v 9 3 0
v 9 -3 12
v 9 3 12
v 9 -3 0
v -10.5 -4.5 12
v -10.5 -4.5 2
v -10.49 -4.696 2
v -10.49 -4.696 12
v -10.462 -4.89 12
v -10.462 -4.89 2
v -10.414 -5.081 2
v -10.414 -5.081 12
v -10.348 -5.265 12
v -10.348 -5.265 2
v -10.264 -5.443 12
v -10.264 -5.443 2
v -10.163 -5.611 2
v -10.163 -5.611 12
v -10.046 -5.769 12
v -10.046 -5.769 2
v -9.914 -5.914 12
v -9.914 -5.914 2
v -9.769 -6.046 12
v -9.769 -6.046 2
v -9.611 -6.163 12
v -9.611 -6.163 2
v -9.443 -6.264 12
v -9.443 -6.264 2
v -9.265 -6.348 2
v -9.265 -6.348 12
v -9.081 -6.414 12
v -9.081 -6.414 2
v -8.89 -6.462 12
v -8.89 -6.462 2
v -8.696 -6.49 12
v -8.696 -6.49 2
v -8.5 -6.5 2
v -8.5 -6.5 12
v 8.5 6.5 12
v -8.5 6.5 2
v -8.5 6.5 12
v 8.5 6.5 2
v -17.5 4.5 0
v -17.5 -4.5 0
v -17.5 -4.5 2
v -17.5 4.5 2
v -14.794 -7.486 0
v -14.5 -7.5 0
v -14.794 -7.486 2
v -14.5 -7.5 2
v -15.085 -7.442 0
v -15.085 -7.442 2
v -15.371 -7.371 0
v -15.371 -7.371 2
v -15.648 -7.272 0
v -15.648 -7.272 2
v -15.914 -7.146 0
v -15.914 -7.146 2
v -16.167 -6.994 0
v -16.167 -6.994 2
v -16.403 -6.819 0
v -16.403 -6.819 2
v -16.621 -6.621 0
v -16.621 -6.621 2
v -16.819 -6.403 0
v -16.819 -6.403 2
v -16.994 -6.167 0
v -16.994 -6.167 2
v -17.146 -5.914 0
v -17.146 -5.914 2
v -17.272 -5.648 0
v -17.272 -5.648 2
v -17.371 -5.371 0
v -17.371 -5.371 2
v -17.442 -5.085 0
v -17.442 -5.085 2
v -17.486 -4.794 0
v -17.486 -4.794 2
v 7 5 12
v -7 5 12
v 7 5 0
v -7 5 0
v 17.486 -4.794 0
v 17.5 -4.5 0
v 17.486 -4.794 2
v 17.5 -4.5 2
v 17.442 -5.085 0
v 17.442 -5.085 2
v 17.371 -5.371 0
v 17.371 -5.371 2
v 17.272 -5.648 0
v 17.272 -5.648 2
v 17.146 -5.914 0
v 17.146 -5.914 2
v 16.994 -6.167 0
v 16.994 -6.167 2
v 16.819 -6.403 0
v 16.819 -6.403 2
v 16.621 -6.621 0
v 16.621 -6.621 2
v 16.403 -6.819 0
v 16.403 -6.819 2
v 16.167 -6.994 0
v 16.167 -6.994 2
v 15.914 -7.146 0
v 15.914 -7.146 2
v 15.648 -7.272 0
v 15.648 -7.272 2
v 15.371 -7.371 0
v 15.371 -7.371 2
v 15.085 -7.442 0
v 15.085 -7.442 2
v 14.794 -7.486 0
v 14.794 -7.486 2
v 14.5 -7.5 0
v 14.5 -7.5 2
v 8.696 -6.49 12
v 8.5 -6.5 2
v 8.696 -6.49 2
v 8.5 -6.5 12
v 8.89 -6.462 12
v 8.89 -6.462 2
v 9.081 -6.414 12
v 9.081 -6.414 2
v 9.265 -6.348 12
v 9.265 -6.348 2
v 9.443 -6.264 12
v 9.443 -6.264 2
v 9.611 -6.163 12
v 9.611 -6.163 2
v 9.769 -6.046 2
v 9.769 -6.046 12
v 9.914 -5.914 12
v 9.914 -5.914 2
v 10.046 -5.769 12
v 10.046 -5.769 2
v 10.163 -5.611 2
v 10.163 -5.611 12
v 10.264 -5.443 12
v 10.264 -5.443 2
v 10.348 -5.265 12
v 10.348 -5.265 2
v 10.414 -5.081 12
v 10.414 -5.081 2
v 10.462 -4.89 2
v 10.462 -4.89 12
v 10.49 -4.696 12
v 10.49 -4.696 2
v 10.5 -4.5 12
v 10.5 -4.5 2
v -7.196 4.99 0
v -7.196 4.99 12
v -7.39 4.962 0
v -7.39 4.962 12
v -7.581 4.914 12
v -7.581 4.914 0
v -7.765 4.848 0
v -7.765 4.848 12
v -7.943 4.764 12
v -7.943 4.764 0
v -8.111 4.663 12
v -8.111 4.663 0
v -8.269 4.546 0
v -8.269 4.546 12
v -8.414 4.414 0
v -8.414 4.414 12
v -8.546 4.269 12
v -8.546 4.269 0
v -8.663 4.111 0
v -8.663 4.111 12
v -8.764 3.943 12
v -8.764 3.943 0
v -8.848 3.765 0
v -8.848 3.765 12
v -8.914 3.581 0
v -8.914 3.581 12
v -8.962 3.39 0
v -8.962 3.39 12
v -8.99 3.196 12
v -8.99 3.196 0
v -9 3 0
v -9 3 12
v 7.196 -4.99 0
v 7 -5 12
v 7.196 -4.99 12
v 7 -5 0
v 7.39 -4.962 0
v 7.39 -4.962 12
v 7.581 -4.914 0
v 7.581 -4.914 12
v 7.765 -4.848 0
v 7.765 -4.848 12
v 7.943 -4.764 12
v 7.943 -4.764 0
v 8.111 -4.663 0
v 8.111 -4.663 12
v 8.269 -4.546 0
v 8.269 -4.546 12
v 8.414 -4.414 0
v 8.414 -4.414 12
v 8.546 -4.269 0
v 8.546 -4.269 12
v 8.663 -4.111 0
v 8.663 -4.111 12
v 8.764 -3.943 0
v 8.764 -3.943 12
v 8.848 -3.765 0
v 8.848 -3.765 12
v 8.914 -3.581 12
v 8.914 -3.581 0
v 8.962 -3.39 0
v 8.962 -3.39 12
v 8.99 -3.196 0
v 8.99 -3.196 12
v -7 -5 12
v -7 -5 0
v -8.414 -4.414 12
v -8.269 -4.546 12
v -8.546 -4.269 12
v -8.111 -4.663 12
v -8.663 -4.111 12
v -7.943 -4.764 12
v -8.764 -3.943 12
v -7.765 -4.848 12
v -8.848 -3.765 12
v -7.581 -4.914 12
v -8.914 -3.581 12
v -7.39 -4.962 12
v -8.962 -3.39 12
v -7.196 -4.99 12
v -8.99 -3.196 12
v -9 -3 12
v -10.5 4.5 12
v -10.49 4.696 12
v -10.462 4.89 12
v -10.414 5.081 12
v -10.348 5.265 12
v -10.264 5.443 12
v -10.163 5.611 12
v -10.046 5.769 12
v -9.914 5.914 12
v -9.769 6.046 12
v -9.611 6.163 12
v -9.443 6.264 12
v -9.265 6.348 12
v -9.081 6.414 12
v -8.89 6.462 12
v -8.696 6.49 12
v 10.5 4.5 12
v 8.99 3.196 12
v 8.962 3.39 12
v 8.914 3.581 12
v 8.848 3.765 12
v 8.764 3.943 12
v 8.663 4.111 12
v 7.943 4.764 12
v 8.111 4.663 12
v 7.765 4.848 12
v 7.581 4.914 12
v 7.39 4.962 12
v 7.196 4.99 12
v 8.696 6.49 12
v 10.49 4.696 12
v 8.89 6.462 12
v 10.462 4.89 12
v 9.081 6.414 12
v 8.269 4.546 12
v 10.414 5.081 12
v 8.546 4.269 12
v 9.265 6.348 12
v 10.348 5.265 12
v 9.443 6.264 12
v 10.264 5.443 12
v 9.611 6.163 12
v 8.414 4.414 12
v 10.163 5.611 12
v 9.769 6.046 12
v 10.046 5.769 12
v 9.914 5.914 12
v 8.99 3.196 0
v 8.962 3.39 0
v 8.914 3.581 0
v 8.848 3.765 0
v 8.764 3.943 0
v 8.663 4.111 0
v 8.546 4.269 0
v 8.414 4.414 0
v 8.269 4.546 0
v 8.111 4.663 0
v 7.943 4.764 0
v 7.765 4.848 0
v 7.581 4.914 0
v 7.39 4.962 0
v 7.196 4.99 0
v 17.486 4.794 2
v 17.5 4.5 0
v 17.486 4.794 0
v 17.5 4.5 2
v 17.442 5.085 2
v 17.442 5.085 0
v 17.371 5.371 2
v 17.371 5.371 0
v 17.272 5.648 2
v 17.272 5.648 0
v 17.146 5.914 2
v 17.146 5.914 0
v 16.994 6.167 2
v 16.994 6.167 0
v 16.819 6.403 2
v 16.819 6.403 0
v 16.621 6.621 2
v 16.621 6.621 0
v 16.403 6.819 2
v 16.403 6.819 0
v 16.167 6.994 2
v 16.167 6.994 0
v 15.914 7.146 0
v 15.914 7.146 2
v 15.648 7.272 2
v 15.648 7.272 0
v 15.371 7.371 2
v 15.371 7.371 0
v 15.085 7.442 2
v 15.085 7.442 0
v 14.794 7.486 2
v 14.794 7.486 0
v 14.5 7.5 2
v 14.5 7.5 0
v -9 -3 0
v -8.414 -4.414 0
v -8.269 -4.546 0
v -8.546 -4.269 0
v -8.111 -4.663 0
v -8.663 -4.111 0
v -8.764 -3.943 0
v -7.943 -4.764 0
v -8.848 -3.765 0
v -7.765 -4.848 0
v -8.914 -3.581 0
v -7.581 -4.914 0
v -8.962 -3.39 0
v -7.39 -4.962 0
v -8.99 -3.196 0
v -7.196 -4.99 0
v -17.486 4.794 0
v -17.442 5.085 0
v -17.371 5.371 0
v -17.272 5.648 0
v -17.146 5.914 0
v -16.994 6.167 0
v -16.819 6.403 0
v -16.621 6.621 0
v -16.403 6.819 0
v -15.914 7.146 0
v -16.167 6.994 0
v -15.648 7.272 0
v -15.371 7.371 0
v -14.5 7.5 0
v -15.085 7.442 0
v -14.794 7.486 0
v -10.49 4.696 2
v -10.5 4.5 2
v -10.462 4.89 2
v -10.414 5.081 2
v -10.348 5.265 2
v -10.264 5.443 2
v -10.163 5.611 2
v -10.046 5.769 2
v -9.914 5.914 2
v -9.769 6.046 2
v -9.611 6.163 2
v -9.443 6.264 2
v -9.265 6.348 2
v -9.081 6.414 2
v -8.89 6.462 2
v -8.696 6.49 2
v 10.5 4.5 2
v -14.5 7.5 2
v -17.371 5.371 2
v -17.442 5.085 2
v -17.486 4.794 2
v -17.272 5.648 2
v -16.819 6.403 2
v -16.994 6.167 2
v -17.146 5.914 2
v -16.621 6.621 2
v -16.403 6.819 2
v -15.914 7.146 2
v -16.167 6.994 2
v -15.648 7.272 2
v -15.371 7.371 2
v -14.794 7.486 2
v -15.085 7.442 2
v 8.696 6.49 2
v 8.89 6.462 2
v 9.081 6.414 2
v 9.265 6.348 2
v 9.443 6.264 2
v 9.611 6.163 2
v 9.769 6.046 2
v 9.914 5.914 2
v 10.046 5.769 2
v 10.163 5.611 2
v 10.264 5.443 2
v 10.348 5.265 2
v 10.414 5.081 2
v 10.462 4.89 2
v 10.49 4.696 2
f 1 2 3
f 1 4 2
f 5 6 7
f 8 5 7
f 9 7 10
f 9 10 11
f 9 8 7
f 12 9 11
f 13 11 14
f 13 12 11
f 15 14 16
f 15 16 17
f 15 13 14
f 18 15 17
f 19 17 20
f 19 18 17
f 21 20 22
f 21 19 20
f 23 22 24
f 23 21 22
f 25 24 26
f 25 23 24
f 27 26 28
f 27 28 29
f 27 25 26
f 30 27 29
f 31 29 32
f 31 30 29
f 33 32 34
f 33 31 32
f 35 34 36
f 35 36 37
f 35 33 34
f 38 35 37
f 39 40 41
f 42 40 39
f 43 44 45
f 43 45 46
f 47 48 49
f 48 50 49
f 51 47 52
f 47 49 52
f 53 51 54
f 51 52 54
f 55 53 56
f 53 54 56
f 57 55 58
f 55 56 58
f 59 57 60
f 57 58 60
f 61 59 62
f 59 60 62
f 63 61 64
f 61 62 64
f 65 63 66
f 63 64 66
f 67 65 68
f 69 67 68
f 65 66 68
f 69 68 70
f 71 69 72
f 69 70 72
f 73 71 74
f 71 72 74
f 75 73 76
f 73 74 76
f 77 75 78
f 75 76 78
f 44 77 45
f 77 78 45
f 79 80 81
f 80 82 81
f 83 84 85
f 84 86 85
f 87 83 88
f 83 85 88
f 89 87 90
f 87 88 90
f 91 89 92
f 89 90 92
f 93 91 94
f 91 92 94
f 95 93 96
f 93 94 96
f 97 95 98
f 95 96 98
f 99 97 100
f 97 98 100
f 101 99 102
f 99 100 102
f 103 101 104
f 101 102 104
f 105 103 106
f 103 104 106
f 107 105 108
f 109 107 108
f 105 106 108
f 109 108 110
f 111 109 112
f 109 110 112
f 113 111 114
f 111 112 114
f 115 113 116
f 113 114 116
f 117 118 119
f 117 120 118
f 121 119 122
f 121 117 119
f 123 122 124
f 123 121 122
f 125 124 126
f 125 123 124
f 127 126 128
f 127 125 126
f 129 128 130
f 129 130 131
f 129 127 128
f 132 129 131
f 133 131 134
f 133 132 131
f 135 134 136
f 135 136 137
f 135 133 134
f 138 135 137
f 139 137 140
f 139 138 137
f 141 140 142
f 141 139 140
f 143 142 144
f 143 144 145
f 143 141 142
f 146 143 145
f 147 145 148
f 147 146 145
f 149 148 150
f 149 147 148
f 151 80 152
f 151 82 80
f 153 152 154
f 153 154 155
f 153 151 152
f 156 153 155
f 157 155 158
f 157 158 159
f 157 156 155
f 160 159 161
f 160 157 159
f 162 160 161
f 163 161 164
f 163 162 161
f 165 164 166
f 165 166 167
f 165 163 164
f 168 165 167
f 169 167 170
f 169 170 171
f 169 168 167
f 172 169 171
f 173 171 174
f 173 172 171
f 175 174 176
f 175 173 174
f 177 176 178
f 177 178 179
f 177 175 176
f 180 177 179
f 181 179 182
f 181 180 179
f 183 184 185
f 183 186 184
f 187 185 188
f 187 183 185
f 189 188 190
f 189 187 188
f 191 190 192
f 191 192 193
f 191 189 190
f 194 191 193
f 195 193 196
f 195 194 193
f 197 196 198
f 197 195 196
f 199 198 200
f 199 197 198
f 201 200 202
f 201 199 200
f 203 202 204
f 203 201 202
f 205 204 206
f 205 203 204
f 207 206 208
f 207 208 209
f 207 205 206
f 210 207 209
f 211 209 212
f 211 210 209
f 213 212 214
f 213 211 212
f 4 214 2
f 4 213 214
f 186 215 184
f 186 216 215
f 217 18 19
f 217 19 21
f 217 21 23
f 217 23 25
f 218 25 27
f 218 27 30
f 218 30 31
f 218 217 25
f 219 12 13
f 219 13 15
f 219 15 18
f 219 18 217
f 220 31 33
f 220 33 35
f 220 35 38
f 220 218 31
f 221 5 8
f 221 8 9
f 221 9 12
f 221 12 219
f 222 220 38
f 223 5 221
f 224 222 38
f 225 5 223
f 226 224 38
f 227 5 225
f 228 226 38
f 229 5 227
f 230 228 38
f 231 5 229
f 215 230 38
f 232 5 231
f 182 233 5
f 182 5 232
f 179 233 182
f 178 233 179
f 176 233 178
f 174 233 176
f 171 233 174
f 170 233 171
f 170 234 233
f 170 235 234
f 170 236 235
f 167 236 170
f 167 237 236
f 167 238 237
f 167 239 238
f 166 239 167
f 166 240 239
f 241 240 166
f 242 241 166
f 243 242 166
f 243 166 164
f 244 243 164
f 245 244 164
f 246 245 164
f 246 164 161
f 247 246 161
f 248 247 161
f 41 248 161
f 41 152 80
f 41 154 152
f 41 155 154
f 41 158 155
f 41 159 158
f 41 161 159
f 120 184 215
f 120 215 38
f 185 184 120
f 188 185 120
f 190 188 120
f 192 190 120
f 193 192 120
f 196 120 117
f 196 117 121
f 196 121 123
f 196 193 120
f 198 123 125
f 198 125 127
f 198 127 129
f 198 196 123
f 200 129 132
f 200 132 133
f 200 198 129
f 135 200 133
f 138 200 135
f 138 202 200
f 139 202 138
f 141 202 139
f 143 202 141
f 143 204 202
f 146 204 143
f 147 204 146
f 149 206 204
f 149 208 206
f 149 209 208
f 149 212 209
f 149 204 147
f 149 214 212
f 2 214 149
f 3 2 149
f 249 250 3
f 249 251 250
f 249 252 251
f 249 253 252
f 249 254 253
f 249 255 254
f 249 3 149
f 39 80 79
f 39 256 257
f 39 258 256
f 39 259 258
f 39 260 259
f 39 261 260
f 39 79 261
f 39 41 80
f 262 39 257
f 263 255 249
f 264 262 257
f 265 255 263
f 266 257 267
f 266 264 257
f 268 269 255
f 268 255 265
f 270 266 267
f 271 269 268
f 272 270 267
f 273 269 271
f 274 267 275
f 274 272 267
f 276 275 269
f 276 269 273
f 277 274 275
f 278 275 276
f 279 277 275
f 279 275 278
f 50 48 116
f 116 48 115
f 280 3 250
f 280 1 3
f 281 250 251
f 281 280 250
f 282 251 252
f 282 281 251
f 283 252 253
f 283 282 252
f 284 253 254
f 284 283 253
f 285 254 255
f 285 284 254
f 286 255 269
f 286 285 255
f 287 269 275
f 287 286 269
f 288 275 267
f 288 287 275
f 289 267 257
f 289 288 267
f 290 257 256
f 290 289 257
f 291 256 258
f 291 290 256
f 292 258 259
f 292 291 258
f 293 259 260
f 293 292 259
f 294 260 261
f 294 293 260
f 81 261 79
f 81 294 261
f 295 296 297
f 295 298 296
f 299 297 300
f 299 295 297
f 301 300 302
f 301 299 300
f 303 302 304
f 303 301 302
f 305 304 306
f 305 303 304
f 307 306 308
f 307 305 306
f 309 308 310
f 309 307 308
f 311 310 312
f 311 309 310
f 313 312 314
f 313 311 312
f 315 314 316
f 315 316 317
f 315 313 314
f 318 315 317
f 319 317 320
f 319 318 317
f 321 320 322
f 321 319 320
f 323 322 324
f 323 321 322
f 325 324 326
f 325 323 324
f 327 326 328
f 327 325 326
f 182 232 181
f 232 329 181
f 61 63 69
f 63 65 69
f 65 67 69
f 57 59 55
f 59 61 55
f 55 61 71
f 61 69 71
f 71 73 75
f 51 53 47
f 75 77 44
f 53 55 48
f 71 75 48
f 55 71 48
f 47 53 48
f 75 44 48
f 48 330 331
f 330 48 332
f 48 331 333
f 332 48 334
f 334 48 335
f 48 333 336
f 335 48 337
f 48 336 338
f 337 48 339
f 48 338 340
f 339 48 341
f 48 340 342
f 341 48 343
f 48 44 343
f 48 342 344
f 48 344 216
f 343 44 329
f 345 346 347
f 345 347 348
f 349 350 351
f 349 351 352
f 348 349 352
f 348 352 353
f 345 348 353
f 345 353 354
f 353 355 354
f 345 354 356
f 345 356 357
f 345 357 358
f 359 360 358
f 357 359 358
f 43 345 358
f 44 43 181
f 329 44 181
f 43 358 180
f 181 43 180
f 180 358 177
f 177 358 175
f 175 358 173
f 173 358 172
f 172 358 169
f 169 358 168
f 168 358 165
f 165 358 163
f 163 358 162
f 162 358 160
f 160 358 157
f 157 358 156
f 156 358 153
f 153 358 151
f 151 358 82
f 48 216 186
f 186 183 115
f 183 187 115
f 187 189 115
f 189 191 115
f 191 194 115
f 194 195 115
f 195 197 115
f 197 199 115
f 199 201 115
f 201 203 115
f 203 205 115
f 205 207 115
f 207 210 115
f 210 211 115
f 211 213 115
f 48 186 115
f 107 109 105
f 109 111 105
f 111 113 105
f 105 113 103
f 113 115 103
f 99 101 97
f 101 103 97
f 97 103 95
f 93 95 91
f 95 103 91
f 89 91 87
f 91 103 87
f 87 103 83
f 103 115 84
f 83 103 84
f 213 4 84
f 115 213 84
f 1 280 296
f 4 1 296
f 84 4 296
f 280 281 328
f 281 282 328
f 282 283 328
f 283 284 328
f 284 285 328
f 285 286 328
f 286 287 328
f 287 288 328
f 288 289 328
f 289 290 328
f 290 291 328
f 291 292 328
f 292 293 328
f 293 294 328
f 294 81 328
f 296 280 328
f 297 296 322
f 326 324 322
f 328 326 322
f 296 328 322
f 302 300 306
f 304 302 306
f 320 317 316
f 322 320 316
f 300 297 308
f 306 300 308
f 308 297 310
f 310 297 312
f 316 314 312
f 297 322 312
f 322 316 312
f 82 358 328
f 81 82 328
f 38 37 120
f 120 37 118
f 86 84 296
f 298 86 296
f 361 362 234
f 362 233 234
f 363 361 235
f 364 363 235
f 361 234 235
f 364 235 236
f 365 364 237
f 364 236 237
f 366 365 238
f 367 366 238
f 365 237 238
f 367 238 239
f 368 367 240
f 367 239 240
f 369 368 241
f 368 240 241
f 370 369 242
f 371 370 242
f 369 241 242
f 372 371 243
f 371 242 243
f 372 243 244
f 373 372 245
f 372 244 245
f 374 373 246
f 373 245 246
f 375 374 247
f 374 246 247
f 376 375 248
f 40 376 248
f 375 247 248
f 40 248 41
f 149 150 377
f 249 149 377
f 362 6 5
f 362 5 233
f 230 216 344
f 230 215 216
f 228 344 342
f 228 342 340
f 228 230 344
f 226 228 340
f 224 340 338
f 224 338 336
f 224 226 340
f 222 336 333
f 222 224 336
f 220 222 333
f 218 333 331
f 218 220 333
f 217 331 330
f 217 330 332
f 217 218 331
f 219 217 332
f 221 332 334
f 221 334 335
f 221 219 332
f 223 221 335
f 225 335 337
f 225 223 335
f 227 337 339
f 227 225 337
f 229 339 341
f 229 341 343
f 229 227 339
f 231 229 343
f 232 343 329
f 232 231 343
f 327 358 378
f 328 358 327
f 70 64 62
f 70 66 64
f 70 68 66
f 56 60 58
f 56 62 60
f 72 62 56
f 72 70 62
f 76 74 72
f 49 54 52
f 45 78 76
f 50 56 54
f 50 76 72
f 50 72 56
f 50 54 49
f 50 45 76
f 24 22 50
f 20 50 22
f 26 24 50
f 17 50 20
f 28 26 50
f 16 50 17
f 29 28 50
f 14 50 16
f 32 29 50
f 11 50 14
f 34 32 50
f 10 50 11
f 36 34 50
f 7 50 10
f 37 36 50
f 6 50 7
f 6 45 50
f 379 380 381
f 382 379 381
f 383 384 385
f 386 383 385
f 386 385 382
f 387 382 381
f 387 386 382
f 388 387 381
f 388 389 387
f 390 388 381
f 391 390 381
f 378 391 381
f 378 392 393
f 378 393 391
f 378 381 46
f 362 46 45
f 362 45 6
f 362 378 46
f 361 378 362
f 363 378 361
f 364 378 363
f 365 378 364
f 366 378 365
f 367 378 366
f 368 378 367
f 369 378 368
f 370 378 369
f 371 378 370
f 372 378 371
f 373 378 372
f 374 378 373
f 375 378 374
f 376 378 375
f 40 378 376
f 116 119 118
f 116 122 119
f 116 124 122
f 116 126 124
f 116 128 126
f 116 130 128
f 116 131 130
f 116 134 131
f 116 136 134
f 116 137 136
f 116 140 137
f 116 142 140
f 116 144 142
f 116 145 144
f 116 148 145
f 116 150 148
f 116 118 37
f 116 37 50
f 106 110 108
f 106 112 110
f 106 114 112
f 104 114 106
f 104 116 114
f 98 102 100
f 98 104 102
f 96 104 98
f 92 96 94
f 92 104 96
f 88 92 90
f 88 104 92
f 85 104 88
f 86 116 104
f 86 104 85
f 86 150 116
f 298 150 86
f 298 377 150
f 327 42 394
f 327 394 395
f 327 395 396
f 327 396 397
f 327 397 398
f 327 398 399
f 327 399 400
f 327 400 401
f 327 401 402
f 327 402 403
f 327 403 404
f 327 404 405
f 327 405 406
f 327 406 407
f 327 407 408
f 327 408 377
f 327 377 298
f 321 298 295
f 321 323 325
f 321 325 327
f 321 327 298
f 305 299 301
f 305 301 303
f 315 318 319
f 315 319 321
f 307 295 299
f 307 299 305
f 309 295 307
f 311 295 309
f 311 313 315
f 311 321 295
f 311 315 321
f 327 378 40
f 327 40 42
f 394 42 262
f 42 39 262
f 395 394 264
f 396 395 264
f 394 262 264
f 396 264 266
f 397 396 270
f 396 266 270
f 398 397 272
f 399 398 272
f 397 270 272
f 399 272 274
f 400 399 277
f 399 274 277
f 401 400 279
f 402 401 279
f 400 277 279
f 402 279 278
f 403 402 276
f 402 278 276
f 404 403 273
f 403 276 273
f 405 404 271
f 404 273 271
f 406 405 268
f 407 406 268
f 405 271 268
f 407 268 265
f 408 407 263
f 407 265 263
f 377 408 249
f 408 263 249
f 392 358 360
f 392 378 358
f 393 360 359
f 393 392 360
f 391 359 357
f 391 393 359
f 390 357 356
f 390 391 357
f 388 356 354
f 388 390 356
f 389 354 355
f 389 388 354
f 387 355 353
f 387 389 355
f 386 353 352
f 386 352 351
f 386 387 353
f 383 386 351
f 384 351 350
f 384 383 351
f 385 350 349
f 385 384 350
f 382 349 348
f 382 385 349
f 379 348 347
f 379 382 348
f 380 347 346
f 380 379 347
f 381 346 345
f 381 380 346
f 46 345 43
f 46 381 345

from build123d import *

# Parameters (mm, degrees)
SKETCH_1_W      = 35
SKETCH_1_H      = 15
SKETCH_1_W_2    = 18
SKETCH_1_H_2    = 10
EXTRUDE_1_DEPTH = 2
SKETCH_2_W      = 21
SKETCH_2_H      = 13
SKETCH_2_W_2    = 18
SKETCH_2_H_2    = 10
EXTRUDE_2_DEPTH = 10
FILLET_1_R      = 3
FILLET_2_R      = 2
FILLET_3_R      = 2


with BuildPart() as part:
    # 草图1 → 凸台-拉伸1 (new body)
    with BuildSketch(Plane.XY):
        Rectangle(SKETCH_1_W, SKETCH_1_H)
        Rectangle(SKETCH_1_W_2, SKETCH_1_H_2, mode=Mode.SUBTRACT)
    extrude(amount=EXTRUDE_1_DEPTH)

    # 草图2 → 凸台-拉伸2 (add)
    with BuildSketch(Plane.XY.offset(2)):
        Rectangle(SKETCH_2_W, SKETCH_2_H)
        Rectangle(SKETCH_2_W_2, SKETCH_2_H_2, mode=Mode.SUBTRACT)
    extrude(amount=EXTRUDE_2_DEPTH)

    # 圆角1
    fillet_1_edges = [part.edges().sort_by_distance(p)[0] for p in [
        (17.5, -7.5, 1),
        (-17.5, -7.5, 1),
        (-17.5, 7.5, 1),
        (17.5, 7.5, 1),
    ]]
    fillet(fillet_1_edges, radius=FILLET_1_R)

    # 圆角2
    fillet_2_edges = [part.edges().sort_by_distance(p)[0] for p in [
        (9, -5, 6),
        (9, 5, 6),
        (-9, 5, 6),
        (-9, -5, 6),
    ]]
    fillet(fillet_2_edges, radius=FILLET_2_R)

    # 圆角3
    fillet_3_edges = [part.edges().sort_by_distance(p)[0] for p in [
        (10.5, -6.5, 7),
        (10.5, 6.5, 7),
        (-10.5, 6.5, 7),
        (-10.5, -6.5, 7),
    ]]
    fillet(fillet_3_edges, radius=FILLET_3_R)


solid = part.part
